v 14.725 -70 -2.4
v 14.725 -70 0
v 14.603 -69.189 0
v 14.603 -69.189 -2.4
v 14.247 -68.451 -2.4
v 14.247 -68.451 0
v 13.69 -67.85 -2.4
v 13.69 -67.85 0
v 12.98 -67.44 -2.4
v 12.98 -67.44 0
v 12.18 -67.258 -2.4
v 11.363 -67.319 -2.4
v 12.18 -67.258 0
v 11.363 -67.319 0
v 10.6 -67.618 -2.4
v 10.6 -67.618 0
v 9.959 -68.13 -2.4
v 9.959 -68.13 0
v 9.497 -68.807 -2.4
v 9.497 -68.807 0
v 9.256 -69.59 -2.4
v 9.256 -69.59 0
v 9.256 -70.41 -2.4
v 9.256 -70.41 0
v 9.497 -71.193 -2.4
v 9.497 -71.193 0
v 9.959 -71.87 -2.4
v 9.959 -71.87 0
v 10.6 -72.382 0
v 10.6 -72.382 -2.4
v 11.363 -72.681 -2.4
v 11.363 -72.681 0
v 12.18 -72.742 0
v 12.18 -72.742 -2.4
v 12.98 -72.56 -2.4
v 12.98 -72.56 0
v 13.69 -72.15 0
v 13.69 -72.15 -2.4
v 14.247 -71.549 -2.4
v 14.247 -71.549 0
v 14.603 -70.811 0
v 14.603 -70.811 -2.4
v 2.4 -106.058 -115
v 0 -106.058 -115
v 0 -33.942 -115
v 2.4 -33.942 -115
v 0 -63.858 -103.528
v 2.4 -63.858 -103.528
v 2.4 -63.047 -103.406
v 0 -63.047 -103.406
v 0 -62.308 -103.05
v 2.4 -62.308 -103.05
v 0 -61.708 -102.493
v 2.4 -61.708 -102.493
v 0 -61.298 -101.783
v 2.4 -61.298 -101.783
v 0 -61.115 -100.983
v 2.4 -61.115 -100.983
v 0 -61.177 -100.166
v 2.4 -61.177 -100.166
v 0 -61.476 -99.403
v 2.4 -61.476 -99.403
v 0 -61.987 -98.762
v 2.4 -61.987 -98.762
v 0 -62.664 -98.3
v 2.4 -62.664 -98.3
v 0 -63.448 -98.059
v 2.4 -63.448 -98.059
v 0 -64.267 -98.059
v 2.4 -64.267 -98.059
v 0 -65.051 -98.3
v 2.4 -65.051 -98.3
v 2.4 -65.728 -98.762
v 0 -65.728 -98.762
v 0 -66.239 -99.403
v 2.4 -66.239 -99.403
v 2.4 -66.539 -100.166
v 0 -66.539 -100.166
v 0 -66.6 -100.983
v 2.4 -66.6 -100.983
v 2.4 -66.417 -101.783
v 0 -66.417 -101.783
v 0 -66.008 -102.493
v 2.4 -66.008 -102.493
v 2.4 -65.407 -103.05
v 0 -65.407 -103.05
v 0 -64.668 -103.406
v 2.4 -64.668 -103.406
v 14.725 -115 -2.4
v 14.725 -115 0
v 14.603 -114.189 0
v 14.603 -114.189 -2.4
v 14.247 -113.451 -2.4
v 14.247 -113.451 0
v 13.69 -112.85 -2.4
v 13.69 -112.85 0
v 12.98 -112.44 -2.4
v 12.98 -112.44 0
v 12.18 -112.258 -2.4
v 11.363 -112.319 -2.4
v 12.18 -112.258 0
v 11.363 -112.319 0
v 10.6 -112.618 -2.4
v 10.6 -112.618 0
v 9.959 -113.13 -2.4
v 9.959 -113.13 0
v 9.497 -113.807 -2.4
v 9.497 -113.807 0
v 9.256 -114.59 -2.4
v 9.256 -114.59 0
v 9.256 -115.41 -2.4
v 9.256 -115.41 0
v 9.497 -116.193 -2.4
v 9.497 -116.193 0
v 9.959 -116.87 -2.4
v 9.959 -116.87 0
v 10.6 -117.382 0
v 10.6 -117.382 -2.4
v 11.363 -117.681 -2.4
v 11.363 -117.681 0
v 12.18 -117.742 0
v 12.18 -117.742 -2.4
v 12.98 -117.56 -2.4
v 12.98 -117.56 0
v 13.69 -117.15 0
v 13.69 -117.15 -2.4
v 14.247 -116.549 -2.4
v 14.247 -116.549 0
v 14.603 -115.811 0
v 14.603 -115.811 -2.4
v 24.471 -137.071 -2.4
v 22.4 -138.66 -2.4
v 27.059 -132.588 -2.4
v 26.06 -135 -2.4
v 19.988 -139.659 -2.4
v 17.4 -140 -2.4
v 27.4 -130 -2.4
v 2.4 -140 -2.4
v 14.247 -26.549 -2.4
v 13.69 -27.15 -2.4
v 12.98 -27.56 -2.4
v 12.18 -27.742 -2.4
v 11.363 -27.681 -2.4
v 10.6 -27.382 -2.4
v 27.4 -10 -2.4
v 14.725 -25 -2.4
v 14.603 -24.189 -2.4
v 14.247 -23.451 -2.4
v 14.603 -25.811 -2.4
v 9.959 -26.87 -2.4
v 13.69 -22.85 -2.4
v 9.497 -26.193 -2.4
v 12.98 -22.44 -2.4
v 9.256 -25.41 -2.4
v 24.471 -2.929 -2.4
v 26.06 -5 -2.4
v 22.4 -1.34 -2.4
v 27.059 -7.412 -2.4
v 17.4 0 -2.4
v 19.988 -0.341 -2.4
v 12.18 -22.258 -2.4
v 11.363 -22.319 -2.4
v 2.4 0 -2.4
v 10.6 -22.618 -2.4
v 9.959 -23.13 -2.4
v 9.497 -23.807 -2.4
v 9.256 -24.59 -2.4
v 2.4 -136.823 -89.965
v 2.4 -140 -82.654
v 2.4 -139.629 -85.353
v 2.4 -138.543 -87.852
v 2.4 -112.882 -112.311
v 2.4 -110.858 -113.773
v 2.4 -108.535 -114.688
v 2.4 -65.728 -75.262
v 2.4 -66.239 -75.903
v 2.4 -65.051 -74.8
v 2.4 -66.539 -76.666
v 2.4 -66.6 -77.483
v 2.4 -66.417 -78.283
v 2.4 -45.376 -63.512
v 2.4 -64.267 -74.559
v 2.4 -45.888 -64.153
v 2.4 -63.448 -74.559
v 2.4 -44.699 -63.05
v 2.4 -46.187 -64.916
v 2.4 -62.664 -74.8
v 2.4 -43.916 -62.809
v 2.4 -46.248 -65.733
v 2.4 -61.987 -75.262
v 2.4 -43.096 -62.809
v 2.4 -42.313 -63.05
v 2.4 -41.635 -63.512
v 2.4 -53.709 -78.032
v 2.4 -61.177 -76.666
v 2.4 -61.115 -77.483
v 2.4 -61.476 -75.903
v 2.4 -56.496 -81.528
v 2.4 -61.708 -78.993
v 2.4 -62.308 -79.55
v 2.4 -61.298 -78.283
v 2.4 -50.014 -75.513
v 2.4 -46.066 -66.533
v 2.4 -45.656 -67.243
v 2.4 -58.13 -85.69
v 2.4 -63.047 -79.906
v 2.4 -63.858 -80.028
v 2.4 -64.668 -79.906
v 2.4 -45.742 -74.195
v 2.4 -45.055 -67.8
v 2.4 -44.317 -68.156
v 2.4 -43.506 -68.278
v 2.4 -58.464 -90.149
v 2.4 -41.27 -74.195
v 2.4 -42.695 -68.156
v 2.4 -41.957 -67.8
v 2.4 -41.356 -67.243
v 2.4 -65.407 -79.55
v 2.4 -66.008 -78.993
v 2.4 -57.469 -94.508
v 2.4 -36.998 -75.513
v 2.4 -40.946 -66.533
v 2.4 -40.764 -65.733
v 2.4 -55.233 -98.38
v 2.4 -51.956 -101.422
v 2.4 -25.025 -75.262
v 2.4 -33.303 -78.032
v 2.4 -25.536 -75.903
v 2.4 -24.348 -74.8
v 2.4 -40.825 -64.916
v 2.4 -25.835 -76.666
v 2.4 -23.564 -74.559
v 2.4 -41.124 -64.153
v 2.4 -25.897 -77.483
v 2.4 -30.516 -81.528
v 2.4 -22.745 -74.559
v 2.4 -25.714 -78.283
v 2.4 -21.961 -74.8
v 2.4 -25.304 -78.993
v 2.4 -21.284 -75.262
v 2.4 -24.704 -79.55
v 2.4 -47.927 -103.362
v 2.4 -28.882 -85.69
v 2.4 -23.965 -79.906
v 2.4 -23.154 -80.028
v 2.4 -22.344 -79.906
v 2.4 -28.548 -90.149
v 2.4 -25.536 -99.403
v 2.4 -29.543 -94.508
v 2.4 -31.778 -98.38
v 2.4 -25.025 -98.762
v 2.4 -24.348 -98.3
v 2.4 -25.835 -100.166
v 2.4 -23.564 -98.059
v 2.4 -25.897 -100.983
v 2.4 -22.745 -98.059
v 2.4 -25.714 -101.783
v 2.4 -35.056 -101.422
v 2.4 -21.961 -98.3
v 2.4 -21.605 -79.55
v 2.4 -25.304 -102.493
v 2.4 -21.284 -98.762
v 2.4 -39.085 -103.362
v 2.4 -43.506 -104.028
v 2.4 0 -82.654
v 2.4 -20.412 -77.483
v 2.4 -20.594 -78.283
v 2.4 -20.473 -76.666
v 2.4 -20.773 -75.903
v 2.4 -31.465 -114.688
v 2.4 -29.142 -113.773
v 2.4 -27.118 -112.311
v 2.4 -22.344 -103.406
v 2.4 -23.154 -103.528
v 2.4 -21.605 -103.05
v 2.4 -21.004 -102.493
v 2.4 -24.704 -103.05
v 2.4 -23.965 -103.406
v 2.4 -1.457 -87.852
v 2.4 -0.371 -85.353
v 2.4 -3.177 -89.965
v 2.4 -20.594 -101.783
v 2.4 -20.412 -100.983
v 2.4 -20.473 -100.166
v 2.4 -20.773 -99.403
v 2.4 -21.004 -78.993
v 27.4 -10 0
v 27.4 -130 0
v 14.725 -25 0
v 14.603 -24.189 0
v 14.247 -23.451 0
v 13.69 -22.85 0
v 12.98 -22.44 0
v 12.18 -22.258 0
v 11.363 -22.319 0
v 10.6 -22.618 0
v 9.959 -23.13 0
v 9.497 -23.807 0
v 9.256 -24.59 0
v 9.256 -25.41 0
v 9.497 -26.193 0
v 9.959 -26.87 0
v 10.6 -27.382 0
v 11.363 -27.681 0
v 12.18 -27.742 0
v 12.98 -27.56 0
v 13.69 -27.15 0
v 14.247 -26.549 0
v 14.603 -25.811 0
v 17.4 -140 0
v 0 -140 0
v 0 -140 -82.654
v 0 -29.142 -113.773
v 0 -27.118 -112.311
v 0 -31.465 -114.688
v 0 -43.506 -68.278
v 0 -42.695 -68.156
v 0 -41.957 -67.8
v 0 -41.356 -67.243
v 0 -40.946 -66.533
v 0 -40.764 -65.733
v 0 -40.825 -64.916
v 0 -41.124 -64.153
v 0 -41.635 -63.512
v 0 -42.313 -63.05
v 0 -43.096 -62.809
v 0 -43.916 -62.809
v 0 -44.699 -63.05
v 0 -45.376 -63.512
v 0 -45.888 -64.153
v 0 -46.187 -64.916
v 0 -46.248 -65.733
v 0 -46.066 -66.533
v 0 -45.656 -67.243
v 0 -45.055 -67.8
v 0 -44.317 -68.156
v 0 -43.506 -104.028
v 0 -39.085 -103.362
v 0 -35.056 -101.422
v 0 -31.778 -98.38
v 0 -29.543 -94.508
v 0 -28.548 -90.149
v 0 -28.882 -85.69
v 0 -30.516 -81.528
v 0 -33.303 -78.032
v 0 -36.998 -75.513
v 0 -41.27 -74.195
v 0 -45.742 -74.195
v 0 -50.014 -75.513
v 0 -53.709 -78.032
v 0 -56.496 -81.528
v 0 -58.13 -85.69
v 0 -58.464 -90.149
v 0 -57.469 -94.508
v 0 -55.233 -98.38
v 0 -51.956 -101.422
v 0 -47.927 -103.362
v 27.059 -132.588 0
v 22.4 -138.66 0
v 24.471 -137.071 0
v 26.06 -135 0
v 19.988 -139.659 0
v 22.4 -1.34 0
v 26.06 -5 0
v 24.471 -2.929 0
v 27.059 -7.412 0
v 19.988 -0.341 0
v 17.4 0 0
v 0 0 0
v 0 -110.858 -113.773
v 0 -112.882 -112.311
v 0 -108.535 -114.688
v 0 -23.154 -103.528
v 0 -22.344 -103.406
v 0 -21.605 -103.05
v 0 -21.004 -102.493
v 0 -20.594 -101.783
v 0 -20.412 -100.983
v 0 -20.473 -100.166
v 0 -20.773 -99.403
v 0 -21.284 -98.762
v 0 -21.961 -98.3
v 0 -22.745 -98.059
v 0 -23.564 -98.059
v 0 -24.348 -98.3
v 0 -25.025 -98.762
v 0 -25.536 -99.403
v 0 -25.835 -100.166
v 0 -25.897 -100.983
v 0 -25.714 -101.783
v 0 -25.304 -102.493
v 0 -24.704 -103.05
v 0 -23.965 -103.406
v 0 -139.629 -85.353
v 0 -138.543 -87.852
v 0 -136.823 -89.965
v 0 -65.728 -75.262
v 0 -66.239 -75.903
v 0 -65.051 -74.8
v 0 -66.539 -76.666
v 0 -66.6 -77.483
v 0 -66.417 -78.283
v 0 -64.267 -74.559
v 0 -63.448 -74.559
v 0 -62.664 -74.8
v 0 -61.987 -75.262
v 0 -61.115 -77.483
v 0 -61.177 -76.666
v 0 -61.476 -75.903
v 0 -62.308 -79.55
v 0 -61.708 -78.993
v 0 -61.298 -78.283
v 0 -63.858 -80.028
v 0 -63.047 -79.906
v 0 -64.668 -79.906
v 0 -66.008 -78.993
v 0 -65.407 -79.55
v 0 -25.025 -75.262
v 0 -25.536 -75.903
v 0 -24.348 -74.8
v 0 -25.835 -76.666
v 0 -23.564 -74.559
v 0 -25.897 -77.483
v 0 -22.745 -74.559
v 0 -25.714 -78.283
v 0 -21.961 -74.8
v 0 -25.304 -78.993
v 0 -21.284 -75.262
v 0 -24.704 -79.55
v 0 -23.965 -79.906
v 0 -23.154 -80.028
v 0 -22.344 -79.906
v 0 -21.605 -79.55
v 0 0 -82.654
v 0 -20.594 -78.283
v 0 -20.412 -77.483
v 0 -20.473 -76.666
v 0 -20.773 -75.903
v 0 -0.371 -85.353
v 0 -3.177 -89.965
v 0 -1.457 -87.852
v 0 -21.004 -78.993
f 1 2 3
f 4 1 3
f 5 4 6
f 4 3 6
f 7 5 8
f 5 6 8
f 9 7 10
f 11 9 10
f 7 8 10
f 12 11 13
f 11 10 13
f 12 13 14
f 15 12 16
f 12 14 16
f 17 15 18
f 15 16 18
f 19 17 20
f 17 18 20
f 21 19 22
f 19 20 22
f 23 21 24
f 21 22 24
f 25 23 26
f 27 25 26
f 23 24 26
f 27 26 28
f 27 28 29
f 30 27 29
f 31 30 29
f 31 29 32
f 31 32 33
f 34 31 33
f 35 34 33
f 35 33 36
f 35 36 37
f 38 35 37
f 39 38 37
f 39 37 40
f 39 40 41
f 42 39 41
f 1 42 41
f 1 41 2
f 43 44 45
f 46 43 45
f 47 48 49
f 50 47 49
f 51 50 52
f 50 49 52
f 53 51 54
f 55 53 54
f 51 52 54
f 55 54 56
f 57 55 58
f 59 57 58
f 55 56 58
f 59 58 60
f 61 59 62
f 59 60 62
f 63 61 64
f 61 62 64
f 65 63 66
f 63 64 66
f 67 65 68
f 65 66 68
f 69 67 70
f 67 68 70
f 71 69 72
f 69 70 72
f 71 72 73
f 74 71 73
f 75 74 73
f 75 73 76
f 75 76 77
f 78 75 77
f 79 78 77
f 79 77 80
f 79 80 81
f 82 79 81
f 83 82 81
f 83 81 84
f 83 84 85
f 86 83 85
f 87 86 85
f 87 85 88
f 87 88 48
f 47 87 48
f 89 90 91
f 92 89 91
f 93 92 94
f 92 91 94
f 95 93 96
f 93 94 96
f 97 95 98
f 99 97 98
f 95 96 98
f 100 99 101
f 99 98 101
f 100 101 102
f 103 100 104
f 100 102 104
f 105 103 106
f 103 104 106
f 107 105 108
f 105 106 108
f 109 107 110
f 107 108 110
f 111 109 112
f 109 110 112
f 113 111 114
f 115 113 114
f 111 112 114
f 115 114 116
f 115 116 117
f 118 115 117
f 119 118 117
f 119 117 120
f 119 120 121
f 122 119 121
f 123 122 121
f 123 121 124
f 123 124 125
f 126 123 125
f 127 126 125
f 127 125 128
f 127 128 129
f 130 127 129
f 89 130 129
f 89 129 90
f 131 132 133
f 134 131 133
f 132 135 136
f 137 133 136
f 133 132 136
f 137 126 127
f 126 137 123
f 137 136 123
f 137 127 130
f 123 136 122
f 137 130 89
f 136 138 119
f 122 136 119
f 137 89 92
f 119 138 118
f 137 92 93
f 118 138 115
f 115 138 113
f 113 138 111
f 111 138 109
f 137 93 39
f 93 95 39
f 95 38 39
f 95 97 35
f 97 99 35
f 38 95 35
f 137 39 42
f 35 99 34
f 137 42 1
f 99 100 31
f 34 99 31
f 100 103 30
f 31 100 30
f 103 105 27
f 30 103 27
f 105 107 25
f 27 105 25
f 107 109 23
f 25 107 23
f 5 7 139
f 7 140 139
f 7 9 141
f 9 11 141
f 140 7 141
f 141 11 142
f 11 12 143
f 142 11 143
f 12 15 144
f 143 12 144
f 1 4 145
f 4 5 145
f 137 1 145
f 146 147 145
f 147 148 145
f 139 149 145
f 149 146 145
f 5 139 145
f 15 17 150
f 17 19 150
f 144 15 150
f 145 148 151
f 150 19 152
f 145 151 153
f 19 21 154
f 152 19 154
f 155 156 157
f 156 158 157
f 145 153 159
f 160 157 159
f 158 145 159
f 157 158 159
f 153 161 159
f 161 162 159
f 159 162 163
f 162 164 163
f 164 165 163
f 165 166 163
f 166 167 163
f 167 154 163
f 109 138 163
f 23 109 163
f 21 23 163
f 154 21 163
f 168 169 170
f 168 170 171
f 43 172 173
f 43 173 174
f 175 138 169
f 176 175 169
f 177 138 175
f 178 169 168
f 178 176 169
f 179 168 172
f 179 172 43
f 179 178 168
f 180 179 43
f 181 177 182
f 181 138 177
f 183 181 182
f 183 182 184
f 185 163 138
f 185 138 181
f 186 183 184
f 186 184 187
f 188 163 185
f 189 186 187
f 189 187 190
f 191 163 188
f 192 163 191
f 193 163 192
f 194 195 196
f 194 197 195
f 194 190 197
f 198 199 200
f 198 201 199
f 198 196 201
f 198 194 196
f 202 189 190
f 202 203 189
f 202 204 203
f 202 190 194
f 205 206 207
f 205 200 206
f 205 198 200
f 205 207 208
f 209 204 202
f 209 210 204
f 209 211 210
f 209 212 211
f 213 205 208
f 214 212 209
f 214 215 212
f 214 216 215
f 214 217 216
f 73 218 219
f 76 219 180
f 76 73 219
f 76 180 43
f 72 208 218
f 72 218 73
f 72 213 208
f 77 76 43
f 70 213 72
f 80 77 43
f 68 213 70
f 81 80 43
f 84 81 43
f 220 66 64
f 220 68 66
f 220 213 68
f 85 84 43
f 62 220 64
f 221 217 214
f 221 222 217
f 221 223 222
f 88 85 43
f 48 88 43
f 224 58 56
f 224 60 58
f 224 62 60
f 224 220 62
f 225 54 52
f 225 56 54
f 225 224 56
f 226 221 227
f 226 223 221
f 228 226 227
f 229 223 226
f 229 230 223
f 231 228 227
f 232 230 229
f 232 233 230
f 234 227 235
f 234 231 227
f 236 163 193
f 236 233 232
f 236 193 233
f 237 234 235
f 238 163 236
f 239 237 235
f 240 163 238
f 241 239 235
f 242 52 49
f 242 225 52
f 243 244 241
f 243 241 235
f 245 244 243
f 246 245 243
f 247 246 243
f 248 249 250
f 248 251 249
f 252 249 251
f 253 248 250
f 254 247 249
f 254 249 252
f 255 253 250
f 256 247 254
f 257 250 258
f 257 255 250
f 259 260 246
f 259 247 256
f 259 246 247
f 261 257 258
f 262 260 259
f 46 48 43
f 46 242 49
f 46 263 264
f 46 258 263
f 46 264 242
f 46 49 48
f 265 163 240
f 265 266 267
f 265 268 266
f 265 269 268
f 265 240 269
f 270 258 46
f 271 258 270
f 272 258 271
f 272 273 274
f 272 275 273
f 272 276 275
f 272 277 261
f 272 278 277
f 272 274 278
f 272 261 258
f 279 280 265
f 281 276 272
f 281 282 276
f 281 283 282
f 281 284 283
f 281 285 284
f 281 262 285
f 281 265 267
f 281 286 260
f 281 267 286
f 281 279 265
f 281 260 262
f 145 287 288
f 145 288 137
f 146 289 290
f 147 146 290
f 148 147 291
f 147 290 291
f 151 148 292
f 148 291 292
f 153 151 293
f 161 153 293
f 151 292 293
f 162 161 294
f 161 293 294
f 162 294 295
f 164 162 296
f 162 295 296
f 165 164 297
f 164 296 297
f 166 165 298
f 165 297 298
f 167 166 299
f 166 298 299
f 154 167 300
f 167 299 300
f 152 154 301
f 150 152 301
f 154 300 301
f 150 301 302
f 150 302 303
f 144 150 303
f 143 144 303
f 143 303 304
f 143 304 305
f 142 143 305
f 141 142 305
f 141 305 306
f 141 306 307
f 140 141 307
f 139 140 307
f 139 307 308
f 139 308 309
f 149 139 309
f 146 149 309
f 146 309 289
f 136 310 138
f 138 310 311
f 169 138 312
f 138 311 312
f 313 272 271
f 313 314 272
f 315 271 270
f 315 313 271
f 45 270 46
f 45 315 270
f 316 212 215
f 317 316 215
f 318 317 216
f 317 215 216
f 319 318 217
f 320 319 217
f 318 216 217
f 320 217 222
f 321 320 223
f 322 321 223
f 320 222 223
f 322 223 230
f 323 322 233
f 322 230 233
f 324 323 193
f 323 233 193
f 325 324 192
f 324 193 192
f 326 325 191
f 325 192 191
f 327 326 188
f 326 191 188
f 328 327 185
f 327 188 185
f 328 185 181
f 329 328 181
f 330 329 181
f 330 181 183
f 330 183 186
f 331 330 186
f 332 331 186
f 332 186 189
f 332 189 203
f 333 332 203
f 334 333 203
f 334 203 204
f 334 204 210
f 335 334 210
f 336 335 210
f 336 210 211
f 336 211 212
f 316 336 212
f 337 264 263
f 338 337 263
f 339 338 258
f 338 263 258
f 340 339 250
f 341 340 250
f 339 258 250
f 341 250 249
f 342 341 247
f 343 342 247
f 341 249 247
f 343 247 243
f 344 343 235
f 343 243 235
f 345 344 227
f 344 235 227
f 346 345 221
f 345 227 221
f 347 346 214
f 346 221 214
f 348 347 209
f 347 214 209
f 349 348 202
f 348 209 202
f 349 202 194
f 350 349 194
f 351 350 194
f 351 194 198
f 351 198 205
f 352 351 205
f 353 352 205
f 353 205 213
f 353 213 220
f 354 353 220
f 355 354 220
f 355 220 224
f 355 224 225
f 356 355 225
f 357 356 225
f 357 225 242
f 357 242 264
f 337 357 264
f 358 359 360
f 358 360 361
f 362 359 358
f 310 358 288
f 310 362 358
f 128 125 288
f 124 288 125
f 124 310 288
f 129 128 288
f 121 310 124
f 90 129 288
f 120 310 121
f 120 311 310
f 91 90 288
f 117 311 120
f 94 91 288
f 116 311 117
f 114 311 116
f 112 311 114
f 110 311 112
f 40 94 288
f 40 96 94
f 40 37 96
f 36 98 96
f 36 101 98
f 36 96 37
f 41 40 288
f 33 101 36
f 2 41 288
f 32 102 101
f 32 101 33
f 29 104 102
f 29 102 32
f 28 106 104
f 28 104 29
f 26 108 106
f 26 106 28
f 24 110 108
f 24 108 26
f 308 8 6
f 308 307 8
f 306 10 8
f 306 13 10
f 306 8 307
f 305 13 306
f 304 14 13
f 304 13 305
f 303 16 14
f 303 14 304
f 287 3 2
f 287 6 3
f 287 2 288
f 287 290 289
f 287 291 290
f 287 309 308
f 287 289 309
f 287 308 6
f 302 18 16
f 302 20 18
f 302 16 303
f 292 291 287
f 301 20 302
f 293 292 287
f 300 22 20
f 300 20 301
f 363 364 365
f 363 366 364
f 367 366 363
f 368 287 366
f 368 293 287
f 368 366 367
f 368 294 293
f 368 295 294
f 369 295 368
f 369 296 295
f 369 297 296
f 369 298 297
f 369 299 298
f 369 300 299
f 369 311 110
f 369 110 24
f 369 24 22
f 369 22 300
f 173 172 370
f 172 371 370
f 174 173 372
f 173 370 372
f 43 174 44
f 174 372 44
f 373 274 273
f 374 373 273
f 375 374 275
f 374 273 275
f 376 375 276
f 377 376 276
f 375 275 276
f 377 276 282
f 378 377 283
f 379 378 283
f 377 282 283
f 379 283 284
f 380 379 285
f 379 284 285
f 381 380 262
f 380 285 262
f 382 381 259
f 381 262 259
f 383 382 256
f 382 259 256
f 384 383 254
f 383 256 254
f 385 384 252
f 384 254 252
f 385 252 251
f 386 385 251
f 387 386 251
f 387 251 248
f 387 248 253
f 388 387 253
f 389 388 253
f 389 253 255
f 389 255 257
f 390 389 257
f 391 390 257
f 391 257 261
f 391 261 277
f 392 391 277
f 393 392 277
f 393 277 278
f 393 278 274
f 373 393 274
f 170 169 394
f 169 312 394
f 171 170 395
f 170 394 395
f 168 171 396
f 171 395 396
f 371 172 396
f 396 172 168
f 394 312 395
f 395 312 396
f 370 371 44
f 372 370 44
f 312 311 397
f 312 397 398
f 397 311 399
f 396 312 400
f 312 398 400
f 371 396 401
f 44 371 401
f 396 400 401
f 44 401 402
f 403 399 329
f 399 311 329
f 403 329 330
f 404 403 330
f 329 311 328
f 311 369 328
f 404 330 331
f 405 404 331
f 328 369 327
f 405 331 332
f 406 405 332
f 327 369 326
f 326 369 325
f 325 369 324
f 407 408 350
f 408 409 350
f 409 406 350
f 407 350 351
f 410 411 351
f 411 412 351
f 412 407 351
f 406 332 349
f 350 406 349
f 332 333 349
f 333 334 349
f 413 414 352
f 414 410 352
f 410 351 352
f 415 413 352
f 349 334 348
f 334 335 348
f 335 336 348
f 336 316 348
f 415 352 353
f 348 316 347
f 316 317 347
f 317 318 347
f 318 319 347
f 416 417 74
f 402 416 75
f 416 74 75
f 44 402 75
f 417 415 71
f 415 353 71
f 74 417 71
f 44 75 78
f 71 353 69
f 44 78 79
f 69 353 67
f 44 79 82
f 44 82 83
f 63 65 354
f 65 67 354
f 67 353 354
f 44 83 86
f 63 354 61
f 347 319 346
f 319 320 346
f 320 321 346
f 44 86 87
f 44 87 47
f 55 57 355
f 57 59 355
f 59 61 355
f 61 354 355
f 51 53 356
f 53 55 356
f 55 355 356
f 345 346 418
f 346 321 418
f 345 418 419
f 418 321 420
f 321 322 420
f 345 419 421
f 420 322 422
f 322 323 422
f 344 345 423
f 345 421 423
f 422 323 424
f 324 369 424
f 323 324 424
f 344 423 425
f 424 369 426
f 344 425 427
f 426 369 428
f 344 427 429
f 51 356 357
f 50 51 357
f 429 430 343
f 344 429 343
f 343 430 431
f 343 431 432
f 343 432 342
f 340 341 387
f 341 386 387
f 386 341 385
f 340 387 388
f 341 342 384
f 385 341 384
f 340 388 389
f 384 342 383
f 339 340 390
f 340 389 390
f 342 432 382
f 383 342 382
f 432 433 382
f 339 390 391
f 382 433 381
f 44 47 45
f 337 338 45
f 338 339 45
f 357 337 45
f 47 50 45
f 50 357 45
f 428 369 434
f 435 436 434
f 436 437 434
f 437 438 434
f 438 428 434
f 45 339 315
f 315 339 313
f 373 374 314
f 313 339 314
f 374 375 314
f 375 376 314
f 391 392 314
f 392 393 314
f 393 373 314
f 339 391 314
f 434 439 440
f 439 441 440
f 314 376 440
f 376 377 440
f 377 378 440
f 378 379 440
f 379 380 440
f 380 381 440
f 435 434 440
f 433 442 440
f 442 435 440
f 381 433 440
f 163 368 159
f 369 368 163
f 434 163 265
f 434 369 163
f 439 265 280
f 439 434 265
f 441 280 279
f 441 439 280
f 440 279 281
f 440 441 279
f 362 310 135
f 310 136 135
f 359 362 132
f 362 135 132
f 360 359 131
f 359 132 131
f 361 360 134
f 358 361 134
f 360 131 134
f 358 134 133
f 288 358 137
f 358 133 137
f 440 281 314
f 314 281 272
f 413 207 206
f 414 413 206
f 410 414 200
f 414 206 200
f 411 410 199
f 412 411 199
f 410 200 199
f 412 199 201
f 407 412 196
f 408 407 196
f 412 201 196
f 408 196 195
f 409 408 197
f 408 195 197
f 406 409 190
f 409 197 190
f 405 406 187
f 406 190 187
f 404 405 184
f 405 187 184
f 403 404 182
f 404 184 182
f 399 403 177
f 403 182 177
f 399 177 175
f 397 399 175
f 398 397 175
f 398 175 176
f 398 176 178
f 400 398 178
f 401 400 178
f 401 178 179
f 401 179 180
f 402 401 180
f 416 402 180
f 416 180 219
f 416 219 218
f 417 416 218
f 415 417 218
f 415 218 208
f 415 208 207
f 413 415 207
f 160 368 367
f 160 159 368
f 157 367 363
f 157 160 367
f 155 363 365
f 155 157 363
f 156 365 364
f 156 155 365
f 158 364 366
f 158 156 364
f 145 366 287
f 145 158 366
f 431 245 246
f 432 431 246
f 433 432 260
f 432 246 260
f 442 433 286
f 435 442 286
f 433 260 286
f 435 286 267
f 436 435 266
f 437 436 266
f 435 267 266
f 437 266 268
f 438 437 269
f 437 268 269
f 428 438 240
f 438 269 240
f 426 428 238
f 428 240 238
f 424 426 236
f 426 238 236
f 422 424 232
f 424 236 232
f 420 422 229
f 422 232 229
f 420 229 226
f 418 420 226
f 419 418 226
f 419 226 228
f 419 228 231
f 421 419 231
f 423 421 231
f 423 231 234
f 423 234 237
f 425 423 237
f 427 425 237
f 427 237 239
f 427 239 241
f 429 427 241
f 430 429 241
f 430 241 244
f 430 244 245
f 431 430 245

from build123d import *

# Parameters (mm, degrees)
SKETCH1_W           = 115
SKETCH1_H           = 140
BOSS_EXTRUDE1_DEPTH = 2.4
CUT_EXTRUDE1_DEPTH  = 3.4
FILLET1_R           = 10
SKETCH3_W           = 2.4
SKETCH3_H           = 140
BOSS_EXTRUDE2_DEPTH = 25
FILLET2_R           = 10
SKETCH4_R           = 2.75
CUT_EXTRUDE2_DEPTH  = 116
SKETCH5_R           = 15
SKETCH5_R_2         = 2.75
CUT_EXTRUDE3_DEPTH  = 3.4


with BuildPart() as part:
    # Sketch1 → Boss-Extrude1 (new body)
    with BuildSketch(Plane(origin=(0, 0, 0), x_dir=(0, 0, -1), z_dir=(1, 0, 0))):
        with Locations((57.5, -70)):
            Rectangle(SKETCH1_W, SKETCH1_H)
    extrude(amount=BOSS_EXTRUDE1_DEPTH)

    # Sketch2 → Cut-Extrude1 (cut, through all)
    with BuildSketch(Plane(origin=(2.4, 0, 0), x_dir=(0, 0, -1), z_dir=(1, 0, 0))):
        Polygon((87, 0), (115, -30), (142.616199658, -32.505405645), (142.616199658, 14.875556406), align=None)
        Polygon((115, -110), (87, -140), (87, -152.661109726), (136.310004643, -152.661109726), align=None)
    extrude(amount=-CUT_EXTRUDE1_DEPTH, mode=Mode.SUBTRACT)

    # Fillet1
    fillet1_edges = [part.edges().sort_by_distance(p)[0] for p in [
        (1.2, 0, -87),
        (1.2, -30, -115),
        (1.2, -110, -115),
        (1.2, -140, -87),
    ]]
    fillet(fillet1_edges, radius=FILLET1_R)

    # Sketch3 → Boss-Extrude2 (add)
    with BuildSketch(Plane(origin=(2.4, 0, 0), x_dir=(0, 0, -1), z_dir=(1, 0, 0))):
        with Locations((1.2, -70)):
            Rectangle(SKETCH3_W, SKETCH3_H)
    extrude(amount=BOSS_EXTRUDE2_DEPTH)

    # Fillet2
    fillet2_edges = [part.edges().sort_by_distance(p)[0] for p in [
        (27.4, -140, -1.2),
        (27.4, 0, -1.2),
    ]]
    fillet(fillet2_edges, radius=FILLET2_R)

    # Sketch4 → Cut-Extrude2 (cut, through all)
    with BuildSketch(Plane.XY):
        with Locations((11.974983581, -70)):
            Circle(SKETCH4_R)
        with Locations((11.974983581, -25)):
            Circle(SKETCH4_R)
        with Locations((11.974983581, -115)):
            Circle(SKETCH4_R)
    extrude(amount=-CUT_EXTRUDE2_DEPTH, mode=Mode.SUBTRACT)

    # Sketch5 → Cut-Extrude3 (cut, through all)
    with BuildSketch(Plane(origin=(2.4, 0, 0), x_dir=(0, 0, -1), z_dir=(1, 0, 0))):
        with Locations((89.027947804, -43.505970801)):
            Circle(SKETCH5_R)
        with Locations((77.277947804, -23.154373812)):
            Circle(SKETCH5_R_2)
        with Locations((100.777947804, -23.154373812)):
            Circle(SKETCH5_R_2)
        with Locations((65.527947804, -43.505970801)):
            Circle(SKETCH5_R_2)
        with Locations((77.277947804, -63.85756779)):
            Circle(SKETCH5_R_2)
        with Locations((100.777947804, -63.85756779)):
            Circle(SKETCH5_R_2)
    extrude(amount=-CUT_EXTRUDE3_DEPTH, mode=Mode.SUBTRACT)


solid = part.part
